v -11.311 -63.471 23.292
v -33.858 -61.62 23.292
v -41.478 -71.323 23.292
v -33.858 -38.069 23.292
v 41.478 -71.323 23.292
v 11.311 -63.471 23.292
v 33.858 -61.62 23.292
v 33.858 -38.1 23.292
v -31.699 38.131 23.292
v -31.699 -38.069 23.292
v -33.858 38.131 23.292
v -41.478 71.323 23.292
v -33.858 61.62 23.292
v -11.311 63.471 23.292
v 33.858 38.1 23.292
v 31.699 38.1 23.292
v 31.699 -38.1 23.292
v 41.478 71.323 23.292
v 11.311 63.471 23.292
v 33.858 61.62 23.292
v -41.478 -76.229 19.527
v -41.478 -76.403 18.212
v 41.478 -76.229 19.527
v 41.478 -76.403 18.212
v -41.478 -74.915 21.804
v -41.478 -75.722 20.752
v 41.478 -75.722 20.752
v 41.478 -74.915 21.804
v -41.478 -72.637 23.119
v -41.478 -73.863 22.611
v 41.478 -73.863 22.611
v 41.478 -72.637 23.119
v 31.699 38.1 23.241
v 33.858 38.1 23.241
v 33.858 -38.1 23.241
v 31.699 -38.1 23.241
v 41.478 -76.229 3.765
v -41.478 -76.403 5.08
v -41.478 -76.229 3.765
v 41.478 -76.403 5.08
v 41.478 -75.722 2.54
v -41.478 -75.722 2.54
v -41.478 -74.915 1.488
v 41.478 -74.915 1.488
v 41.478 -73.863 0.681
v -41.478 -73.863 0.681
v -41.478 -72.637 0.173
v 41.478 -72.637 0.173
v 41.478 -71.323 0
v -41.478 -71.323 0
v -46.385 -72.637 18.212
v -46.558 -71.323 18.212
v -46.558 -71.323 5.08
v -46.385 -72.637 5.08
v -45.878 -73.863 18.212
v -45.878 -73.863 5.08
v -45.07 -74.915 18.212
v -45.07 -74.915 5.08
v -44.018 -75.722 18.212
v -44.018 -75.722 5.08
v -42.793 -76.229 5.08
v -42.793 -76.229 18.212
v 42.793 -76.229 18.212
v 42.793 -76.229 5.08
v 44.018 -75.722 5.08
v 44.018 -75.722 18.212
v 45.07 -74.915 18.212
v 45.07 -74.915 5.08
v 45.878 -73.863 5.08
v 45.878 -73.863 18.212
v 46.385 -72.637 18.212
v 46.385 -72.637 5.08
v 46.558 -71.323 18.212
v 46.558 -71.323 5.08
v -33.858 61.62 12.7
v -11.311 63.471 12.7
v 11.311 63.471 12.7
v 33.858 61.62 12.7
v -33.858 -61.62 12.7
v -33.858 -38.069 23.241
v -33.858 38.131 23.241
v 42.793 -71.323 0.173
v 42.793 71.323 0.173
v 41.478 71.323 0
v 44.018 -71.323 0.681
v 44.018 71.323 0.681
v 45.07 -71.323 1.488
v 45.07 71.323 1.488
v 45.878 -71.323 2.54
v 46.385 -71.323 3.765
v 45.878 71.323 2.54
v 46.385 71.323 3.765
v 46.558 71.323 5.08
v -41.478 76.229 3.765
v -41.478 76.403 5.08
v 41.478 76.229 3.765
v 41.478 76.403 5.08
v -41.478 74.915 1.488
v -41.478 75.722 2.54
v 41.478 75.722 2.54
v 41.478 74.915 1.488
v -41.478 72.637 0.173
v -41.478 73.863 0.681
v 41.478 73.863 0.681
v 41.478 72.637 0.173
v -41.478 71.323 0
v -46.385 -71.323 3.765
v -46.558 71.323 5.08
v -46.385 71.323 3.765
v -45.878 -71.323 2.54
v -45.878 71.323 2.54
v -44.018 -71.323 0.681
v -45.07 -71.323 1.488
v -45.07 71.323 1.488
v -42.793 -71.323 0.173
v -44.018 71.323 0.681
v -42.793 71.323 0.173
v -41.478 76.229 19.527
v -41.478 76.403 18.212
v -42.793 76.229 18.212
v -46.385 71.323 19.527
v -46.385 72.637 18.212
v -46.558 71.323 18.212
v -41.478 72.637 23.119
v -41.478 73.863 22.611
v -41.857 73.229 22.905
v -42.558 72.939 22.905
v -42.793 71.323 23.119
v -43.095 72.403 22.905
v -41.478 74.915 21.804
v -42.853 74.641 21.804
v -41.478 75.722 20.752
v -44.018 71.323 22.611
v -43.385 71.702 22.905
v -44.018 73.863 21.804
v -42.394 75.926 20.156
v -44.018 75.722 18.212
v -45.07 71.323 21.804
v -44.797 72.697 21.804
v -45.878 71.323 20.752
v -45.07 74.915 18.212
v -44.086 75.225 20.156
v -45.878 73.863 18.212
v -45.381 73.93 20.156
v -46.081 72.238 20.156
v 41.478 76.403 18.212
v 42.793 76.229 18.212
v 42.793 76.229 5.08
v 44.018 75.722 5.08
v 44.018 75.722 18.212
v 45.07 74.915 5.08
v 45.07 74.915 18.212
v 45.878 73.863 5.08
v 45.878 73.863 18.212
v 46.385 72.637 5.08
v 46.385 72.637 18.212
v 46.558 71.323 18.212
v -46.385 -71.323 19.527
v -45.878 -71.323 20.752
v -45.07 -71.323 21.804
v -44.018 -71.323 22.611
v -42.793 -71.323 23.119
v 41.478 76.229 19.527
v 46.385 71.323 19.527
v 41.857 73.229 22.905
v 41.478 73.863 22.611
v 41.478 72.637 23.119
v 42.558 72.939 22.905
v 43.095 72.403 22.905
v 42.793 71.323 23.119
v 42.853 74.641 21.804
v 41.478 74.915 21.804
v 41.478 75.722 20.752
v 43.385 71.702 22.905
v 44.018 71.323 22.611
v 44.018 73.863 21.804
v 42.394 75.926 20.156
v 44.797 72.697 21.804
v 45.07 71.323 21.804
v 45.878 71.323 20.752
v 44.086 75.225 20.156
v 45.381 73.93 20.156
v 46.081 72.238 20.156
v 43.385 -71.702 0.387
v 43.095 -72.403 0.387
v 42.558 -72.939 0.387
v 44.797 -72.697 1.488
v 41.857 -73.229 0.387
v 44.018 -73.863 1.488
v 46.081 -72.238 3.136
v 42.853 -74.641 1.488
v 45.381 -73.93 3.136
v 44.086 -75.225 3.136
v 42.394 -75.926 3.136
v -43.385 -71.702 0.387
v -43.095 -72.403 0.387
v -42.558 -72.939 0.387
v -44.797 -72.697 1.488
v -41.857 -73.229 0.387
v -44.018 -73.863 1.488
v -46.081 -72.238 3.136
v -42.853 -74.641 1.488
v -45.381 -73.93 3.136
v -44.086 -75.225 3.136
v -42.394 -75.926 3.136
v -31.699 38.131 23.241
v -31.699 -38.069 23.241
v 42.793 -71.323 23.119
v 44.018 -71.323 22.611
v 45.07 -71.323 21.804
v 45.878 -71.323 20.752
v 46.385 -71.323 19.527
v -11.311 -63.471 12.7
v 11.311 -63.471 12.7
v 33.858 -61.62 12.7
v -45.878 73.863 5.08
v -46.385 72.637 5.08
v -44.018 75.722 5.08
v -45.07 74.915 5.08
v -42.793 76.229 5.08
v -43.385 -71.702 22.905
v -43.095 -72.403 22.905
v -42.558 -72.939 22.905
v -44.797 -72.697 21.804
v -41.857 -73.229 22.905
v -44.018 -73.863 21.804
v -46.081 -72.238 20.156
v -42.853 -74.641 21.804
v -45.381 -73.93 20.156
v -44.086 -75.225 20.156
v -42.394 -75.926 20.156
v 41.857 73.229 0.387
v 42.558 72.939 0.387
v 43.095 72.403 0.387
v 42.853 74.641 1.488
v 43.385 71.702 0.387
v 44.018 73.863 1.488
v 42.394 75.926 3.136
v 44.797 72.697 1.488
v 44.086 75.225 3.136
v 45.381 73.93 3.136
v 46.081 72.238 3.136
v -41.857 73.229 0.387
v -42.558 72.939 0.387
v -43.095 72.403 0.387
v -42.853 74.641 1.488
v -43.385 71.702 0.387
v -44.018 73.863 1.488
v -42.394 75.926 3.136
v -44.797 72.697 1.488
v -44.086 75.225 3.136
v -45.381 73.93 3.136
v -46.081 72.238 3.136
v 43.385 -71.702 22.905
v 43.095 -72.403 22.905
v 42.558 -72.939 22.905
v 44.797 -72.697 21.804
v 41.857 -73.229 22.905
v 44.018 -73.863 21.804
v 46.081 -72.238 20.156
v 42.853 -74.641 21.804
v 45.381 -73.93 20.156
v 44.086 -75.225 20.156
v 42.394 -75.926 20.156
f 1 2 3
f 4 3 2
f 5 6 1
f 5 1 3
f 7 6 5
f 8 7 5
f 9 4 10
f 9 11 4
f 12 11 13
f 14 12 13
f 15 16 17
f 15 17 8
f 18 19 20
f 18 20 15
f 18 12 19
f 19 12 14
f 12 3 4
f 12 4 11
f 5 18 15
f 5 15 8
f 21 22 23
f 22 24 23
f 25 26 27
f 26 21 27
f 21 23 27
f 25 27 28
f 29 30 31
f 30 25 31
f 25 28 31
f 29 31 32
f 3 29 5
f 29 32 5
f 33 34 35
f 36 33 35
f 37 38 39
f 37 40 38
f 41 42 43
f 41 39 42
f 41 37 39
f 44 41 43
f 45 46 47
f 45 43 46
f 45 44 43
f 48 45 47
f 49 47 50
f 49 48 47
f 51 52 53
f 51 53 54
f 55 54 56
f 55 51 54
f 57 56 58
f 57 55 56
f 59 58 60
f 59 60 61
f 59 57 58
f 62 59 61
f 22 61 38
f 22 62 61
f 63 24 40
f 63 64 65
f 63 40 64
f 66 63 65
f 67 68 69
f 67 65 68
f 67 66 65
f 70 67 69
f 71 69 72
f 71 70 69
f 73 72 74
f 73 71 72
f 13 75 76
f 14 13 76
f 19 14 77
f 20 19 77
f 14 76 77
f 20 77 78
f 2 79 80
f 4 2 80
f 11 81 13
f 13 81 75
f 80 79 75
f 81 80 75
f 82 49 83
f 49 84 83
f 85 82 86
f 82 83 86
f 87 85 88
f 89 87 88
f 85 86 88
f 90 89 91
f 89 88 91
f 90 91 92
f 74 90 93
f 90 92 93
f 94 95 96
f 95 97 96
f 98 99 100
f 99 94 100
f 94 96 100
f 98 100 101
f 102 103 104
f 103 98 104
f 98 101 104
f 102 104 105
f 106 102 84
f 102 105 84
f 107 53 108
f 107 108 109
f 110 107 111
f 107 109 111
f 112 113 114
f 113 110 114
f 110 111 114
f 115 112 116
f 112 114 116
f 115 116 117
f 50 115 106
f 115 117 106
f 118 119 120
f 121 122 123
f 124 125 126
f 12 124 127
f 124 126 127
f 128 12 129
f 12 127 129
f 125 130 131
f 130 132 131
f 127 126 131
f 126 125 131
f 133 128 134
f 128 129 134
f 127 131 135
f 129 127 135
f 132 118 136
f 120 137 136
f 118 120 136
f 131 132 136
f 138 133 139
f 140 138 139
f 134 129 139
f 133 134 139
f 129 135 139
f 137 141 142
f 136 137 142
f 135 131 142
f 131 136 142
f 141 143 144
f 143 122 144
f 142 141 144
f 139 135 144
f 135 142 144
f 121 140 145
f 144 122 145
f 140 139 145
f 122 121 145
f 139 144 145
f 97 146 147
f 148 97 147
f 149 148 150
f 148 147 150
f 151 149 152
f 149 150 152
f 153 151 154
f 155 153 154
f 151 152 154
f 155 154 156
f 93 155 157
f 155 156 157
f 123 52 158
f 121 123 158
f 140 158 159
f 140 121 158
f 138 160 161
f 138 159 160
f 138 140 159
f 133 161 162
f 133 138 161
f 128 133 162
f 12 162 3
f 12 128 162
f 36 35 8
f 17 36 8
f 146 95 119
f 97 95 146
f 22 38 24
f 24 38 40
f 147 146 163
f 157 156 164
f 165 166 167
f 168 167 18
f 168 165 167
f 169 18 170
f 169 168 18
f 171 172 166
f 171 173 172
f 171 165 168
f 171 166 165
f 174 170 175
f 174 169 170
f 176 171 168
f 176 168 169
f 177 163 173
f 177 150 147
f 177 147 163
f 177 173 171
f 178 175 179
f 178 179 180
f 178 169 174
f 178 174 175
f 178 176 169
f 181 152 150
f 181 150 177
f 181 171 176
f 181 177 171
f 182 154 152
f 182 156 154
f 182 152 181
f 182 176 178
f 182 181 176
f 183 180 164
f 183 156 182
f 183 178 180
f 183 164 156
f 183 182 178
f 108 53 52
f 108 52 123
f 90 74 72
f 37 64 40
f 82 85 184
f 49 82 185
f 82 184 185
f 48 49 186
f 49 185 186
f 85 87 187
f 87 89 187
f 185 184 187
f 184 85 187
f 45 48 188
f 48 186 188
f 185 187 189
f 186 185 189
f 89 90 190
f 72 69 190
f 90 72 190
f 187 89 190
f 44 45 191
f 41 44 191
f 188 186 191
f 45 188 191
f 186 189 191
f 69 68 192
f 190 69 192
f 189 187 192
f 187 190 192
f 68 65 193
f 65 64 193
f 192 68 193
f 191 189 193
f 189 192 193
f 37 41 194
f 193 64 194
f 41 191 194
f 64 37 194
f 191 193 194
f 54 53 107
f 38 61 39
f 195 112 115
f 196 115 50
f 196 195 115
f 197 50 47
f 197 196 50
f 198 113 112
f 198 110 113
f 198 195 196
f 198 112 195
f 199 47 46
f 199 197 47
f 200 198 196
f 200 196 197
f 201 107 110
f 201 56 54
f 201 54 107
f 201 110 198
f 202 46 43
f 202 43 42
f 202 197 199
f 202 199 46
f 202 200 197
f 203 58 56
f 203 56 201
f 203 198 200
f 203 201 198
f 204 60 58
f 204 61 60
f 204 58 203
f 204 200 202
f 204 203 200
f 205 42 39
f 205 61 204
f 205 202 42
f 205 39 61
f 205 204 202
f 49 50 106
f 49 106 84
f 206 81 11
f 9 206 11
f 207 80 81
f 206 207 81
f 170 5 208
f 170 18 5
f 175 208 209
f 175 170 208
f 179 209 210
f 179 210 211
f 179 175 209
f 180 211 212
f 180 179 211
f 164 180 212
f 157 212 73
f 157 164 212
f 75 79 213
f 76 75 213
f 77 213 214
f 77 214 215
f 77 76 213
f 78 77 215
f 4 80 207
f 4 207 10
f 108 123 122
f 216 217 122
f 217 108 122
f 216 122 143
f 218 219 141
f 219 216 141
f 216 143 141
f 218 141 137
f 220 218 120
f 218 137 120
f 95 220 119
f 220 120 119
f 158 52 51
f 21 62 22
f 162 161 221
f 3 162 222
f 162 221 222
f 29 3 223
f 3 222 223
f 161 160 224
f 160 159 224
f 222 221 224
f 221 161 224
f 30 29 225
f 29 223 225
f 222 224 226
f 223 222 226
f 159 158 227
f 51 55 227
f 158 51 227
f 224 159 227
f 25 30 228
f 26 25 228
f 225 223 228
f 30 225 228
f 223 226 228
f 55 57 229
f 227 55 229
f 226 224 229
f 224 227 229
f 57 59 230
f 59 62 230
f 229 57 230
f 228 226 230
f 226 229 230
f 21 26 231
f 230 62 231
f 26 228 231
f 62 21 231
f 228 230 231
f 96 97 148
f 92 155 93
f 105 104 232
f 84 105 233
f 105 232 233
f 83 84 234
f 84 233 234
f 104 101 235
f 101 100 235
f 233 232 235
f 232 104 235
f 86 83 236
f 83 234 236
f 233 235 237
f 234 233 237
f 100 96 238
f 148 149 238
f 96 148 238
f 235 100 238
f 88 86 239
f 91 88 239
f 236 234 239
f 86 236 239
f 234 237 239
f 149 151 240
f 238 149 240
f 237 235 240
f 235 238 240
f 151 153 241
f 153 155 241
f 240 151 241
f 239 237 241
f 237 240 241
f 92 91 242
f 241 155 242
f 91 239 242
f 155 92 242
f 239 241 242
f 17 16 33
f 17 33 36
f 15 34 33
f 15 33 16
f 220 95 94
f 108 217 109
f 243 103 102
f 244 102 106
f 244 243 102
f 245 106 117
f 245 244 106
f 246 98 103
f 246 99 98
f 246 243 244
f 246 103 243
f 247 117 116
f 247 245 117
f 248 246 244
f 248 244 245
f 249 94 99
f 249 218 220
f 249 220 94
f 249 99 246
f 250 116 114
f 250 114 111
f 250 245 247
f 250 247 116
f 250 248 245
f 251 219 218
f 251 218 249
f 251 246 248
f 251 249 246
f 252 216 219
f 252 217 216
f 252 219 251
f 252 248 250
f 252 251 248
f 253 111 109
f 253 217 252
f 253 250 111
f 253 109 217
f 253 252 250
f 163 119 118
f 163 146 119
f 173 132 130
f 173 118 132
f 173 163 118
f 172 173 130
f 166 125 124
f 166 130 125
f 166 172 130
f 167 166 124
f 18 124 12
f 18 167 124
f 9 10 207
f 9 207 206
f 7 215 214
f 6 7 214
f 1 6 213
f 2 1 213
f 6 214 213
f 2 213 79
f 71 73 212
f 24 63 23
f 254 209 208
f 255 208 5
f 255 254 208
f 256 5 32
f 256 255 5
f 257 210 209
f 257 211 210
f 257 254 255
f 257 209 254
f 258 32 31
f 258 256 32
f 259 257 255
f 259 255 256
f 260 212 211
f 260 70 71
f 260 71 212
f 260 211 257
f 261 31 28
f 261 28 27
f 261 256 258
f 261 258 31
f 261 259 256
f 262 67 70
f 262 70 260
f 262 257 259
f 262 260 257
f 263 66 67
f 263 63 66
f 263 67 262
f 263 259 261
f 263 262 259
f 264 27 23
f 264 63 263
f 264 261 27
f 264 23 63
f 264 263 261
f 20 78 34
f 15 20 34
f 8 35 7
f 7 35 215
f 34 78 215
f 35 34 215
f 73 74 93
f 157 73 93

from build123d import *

# Parameters (mm, degrees)
F1_DEPTH = 12.7
F0_W     = 93.1164
F0_H     = 152.805166
F2_DEPTH = 23.2918
F3_R     = 5.08
F4_W     = 76.2
F4_H     = 0.0508
F5_DEPTH = 2.159
F6_W     = 76.2
F6_H     = 0.0508
F7_DEPTH = 2.159


with BuildPart() as f1:
    # F0 (on Top) → F1 (new body)
    with BuildSketch(Plane.XY):
        with BuildLine():
            Line((33.8582, -61.6204), (33.8582, 61.6204))
            ThreePointArc((33.8582, 61.6204), (0, 63.702583), (-33.8582, 61.6204))
            Line((-33.8582, 61.6204), (-33.8582, -61.6204))
            ThreePointArc((-33.8582, -61.6204), (0, -63.702583), (33.8582, -61.6204))
        make_face()
    extrude(amount=F1_DEPTH)

    # F0 (on Top) → F2 (join)
    with BuildSketch(Plane.XY):
        Rectangle(F0_W, F0_H)
        with BuildLine():
            ThreePointArc((-33.8582, 61.6204), (0, 63.702583), (33.8582, 61.6204))
            Line((33.8582, 61.6204), (33.8582, -61.6204))
            ThreePointArc((33.8582, -61.6204), (0, -63.702583), (-33.8582, -61.6204))
            Line((-33.8582, -61.6204), (-33.8582, 61.6204))
        make_face(mode=Mode.SUBTRACT)
    extrude(amount=F2_DEPTH)

    # F3
    f3_edges = [f1.edges().sort_by_distance(p)[0] for p in [
        (46.5582, 76.402583, 11.6459),
        (-46.5582, 76.402583, 11.6459),
        (0, 76.402583, 0),
        (0, 76.402583, 23.2918),
        (46.5582, -76.402583, 11.6459),
        (46.5582, 0, 0),
        (46.5582, 0, 23.2918),
        (-46.5582, -76.402583, 11.6459),
        (-46.5582, 0, 0),
        (-46.5582, 0, 23.2918),
        (0, -76.402583, 0),
        (0, -76.402583, 23.2918),
    ]]
    fillet(f3_edges, radius=F3_R)

    # F4 (on face) → F5 (join)
    with BuildSketch(Plane.YZ.offset(-33.8582)):
        with Locations((0.031095, 23.2664)):
            Rectangle(F4_W, F4_H)
    extrude(amount=F5_DEPTH)

    # F6 (on face) → F7 (join)
    with BuildSketch(Plane(origin=(33.8582, 0, 0), x_dir=(0, -1, 0), z_dir=(-1, 0, 0))):
        with Locations((0, 23.2664)):
            Rectangle(F6_W, F6_H)
    extrude(amount=F7_DEPTH)


solid = f1.part
